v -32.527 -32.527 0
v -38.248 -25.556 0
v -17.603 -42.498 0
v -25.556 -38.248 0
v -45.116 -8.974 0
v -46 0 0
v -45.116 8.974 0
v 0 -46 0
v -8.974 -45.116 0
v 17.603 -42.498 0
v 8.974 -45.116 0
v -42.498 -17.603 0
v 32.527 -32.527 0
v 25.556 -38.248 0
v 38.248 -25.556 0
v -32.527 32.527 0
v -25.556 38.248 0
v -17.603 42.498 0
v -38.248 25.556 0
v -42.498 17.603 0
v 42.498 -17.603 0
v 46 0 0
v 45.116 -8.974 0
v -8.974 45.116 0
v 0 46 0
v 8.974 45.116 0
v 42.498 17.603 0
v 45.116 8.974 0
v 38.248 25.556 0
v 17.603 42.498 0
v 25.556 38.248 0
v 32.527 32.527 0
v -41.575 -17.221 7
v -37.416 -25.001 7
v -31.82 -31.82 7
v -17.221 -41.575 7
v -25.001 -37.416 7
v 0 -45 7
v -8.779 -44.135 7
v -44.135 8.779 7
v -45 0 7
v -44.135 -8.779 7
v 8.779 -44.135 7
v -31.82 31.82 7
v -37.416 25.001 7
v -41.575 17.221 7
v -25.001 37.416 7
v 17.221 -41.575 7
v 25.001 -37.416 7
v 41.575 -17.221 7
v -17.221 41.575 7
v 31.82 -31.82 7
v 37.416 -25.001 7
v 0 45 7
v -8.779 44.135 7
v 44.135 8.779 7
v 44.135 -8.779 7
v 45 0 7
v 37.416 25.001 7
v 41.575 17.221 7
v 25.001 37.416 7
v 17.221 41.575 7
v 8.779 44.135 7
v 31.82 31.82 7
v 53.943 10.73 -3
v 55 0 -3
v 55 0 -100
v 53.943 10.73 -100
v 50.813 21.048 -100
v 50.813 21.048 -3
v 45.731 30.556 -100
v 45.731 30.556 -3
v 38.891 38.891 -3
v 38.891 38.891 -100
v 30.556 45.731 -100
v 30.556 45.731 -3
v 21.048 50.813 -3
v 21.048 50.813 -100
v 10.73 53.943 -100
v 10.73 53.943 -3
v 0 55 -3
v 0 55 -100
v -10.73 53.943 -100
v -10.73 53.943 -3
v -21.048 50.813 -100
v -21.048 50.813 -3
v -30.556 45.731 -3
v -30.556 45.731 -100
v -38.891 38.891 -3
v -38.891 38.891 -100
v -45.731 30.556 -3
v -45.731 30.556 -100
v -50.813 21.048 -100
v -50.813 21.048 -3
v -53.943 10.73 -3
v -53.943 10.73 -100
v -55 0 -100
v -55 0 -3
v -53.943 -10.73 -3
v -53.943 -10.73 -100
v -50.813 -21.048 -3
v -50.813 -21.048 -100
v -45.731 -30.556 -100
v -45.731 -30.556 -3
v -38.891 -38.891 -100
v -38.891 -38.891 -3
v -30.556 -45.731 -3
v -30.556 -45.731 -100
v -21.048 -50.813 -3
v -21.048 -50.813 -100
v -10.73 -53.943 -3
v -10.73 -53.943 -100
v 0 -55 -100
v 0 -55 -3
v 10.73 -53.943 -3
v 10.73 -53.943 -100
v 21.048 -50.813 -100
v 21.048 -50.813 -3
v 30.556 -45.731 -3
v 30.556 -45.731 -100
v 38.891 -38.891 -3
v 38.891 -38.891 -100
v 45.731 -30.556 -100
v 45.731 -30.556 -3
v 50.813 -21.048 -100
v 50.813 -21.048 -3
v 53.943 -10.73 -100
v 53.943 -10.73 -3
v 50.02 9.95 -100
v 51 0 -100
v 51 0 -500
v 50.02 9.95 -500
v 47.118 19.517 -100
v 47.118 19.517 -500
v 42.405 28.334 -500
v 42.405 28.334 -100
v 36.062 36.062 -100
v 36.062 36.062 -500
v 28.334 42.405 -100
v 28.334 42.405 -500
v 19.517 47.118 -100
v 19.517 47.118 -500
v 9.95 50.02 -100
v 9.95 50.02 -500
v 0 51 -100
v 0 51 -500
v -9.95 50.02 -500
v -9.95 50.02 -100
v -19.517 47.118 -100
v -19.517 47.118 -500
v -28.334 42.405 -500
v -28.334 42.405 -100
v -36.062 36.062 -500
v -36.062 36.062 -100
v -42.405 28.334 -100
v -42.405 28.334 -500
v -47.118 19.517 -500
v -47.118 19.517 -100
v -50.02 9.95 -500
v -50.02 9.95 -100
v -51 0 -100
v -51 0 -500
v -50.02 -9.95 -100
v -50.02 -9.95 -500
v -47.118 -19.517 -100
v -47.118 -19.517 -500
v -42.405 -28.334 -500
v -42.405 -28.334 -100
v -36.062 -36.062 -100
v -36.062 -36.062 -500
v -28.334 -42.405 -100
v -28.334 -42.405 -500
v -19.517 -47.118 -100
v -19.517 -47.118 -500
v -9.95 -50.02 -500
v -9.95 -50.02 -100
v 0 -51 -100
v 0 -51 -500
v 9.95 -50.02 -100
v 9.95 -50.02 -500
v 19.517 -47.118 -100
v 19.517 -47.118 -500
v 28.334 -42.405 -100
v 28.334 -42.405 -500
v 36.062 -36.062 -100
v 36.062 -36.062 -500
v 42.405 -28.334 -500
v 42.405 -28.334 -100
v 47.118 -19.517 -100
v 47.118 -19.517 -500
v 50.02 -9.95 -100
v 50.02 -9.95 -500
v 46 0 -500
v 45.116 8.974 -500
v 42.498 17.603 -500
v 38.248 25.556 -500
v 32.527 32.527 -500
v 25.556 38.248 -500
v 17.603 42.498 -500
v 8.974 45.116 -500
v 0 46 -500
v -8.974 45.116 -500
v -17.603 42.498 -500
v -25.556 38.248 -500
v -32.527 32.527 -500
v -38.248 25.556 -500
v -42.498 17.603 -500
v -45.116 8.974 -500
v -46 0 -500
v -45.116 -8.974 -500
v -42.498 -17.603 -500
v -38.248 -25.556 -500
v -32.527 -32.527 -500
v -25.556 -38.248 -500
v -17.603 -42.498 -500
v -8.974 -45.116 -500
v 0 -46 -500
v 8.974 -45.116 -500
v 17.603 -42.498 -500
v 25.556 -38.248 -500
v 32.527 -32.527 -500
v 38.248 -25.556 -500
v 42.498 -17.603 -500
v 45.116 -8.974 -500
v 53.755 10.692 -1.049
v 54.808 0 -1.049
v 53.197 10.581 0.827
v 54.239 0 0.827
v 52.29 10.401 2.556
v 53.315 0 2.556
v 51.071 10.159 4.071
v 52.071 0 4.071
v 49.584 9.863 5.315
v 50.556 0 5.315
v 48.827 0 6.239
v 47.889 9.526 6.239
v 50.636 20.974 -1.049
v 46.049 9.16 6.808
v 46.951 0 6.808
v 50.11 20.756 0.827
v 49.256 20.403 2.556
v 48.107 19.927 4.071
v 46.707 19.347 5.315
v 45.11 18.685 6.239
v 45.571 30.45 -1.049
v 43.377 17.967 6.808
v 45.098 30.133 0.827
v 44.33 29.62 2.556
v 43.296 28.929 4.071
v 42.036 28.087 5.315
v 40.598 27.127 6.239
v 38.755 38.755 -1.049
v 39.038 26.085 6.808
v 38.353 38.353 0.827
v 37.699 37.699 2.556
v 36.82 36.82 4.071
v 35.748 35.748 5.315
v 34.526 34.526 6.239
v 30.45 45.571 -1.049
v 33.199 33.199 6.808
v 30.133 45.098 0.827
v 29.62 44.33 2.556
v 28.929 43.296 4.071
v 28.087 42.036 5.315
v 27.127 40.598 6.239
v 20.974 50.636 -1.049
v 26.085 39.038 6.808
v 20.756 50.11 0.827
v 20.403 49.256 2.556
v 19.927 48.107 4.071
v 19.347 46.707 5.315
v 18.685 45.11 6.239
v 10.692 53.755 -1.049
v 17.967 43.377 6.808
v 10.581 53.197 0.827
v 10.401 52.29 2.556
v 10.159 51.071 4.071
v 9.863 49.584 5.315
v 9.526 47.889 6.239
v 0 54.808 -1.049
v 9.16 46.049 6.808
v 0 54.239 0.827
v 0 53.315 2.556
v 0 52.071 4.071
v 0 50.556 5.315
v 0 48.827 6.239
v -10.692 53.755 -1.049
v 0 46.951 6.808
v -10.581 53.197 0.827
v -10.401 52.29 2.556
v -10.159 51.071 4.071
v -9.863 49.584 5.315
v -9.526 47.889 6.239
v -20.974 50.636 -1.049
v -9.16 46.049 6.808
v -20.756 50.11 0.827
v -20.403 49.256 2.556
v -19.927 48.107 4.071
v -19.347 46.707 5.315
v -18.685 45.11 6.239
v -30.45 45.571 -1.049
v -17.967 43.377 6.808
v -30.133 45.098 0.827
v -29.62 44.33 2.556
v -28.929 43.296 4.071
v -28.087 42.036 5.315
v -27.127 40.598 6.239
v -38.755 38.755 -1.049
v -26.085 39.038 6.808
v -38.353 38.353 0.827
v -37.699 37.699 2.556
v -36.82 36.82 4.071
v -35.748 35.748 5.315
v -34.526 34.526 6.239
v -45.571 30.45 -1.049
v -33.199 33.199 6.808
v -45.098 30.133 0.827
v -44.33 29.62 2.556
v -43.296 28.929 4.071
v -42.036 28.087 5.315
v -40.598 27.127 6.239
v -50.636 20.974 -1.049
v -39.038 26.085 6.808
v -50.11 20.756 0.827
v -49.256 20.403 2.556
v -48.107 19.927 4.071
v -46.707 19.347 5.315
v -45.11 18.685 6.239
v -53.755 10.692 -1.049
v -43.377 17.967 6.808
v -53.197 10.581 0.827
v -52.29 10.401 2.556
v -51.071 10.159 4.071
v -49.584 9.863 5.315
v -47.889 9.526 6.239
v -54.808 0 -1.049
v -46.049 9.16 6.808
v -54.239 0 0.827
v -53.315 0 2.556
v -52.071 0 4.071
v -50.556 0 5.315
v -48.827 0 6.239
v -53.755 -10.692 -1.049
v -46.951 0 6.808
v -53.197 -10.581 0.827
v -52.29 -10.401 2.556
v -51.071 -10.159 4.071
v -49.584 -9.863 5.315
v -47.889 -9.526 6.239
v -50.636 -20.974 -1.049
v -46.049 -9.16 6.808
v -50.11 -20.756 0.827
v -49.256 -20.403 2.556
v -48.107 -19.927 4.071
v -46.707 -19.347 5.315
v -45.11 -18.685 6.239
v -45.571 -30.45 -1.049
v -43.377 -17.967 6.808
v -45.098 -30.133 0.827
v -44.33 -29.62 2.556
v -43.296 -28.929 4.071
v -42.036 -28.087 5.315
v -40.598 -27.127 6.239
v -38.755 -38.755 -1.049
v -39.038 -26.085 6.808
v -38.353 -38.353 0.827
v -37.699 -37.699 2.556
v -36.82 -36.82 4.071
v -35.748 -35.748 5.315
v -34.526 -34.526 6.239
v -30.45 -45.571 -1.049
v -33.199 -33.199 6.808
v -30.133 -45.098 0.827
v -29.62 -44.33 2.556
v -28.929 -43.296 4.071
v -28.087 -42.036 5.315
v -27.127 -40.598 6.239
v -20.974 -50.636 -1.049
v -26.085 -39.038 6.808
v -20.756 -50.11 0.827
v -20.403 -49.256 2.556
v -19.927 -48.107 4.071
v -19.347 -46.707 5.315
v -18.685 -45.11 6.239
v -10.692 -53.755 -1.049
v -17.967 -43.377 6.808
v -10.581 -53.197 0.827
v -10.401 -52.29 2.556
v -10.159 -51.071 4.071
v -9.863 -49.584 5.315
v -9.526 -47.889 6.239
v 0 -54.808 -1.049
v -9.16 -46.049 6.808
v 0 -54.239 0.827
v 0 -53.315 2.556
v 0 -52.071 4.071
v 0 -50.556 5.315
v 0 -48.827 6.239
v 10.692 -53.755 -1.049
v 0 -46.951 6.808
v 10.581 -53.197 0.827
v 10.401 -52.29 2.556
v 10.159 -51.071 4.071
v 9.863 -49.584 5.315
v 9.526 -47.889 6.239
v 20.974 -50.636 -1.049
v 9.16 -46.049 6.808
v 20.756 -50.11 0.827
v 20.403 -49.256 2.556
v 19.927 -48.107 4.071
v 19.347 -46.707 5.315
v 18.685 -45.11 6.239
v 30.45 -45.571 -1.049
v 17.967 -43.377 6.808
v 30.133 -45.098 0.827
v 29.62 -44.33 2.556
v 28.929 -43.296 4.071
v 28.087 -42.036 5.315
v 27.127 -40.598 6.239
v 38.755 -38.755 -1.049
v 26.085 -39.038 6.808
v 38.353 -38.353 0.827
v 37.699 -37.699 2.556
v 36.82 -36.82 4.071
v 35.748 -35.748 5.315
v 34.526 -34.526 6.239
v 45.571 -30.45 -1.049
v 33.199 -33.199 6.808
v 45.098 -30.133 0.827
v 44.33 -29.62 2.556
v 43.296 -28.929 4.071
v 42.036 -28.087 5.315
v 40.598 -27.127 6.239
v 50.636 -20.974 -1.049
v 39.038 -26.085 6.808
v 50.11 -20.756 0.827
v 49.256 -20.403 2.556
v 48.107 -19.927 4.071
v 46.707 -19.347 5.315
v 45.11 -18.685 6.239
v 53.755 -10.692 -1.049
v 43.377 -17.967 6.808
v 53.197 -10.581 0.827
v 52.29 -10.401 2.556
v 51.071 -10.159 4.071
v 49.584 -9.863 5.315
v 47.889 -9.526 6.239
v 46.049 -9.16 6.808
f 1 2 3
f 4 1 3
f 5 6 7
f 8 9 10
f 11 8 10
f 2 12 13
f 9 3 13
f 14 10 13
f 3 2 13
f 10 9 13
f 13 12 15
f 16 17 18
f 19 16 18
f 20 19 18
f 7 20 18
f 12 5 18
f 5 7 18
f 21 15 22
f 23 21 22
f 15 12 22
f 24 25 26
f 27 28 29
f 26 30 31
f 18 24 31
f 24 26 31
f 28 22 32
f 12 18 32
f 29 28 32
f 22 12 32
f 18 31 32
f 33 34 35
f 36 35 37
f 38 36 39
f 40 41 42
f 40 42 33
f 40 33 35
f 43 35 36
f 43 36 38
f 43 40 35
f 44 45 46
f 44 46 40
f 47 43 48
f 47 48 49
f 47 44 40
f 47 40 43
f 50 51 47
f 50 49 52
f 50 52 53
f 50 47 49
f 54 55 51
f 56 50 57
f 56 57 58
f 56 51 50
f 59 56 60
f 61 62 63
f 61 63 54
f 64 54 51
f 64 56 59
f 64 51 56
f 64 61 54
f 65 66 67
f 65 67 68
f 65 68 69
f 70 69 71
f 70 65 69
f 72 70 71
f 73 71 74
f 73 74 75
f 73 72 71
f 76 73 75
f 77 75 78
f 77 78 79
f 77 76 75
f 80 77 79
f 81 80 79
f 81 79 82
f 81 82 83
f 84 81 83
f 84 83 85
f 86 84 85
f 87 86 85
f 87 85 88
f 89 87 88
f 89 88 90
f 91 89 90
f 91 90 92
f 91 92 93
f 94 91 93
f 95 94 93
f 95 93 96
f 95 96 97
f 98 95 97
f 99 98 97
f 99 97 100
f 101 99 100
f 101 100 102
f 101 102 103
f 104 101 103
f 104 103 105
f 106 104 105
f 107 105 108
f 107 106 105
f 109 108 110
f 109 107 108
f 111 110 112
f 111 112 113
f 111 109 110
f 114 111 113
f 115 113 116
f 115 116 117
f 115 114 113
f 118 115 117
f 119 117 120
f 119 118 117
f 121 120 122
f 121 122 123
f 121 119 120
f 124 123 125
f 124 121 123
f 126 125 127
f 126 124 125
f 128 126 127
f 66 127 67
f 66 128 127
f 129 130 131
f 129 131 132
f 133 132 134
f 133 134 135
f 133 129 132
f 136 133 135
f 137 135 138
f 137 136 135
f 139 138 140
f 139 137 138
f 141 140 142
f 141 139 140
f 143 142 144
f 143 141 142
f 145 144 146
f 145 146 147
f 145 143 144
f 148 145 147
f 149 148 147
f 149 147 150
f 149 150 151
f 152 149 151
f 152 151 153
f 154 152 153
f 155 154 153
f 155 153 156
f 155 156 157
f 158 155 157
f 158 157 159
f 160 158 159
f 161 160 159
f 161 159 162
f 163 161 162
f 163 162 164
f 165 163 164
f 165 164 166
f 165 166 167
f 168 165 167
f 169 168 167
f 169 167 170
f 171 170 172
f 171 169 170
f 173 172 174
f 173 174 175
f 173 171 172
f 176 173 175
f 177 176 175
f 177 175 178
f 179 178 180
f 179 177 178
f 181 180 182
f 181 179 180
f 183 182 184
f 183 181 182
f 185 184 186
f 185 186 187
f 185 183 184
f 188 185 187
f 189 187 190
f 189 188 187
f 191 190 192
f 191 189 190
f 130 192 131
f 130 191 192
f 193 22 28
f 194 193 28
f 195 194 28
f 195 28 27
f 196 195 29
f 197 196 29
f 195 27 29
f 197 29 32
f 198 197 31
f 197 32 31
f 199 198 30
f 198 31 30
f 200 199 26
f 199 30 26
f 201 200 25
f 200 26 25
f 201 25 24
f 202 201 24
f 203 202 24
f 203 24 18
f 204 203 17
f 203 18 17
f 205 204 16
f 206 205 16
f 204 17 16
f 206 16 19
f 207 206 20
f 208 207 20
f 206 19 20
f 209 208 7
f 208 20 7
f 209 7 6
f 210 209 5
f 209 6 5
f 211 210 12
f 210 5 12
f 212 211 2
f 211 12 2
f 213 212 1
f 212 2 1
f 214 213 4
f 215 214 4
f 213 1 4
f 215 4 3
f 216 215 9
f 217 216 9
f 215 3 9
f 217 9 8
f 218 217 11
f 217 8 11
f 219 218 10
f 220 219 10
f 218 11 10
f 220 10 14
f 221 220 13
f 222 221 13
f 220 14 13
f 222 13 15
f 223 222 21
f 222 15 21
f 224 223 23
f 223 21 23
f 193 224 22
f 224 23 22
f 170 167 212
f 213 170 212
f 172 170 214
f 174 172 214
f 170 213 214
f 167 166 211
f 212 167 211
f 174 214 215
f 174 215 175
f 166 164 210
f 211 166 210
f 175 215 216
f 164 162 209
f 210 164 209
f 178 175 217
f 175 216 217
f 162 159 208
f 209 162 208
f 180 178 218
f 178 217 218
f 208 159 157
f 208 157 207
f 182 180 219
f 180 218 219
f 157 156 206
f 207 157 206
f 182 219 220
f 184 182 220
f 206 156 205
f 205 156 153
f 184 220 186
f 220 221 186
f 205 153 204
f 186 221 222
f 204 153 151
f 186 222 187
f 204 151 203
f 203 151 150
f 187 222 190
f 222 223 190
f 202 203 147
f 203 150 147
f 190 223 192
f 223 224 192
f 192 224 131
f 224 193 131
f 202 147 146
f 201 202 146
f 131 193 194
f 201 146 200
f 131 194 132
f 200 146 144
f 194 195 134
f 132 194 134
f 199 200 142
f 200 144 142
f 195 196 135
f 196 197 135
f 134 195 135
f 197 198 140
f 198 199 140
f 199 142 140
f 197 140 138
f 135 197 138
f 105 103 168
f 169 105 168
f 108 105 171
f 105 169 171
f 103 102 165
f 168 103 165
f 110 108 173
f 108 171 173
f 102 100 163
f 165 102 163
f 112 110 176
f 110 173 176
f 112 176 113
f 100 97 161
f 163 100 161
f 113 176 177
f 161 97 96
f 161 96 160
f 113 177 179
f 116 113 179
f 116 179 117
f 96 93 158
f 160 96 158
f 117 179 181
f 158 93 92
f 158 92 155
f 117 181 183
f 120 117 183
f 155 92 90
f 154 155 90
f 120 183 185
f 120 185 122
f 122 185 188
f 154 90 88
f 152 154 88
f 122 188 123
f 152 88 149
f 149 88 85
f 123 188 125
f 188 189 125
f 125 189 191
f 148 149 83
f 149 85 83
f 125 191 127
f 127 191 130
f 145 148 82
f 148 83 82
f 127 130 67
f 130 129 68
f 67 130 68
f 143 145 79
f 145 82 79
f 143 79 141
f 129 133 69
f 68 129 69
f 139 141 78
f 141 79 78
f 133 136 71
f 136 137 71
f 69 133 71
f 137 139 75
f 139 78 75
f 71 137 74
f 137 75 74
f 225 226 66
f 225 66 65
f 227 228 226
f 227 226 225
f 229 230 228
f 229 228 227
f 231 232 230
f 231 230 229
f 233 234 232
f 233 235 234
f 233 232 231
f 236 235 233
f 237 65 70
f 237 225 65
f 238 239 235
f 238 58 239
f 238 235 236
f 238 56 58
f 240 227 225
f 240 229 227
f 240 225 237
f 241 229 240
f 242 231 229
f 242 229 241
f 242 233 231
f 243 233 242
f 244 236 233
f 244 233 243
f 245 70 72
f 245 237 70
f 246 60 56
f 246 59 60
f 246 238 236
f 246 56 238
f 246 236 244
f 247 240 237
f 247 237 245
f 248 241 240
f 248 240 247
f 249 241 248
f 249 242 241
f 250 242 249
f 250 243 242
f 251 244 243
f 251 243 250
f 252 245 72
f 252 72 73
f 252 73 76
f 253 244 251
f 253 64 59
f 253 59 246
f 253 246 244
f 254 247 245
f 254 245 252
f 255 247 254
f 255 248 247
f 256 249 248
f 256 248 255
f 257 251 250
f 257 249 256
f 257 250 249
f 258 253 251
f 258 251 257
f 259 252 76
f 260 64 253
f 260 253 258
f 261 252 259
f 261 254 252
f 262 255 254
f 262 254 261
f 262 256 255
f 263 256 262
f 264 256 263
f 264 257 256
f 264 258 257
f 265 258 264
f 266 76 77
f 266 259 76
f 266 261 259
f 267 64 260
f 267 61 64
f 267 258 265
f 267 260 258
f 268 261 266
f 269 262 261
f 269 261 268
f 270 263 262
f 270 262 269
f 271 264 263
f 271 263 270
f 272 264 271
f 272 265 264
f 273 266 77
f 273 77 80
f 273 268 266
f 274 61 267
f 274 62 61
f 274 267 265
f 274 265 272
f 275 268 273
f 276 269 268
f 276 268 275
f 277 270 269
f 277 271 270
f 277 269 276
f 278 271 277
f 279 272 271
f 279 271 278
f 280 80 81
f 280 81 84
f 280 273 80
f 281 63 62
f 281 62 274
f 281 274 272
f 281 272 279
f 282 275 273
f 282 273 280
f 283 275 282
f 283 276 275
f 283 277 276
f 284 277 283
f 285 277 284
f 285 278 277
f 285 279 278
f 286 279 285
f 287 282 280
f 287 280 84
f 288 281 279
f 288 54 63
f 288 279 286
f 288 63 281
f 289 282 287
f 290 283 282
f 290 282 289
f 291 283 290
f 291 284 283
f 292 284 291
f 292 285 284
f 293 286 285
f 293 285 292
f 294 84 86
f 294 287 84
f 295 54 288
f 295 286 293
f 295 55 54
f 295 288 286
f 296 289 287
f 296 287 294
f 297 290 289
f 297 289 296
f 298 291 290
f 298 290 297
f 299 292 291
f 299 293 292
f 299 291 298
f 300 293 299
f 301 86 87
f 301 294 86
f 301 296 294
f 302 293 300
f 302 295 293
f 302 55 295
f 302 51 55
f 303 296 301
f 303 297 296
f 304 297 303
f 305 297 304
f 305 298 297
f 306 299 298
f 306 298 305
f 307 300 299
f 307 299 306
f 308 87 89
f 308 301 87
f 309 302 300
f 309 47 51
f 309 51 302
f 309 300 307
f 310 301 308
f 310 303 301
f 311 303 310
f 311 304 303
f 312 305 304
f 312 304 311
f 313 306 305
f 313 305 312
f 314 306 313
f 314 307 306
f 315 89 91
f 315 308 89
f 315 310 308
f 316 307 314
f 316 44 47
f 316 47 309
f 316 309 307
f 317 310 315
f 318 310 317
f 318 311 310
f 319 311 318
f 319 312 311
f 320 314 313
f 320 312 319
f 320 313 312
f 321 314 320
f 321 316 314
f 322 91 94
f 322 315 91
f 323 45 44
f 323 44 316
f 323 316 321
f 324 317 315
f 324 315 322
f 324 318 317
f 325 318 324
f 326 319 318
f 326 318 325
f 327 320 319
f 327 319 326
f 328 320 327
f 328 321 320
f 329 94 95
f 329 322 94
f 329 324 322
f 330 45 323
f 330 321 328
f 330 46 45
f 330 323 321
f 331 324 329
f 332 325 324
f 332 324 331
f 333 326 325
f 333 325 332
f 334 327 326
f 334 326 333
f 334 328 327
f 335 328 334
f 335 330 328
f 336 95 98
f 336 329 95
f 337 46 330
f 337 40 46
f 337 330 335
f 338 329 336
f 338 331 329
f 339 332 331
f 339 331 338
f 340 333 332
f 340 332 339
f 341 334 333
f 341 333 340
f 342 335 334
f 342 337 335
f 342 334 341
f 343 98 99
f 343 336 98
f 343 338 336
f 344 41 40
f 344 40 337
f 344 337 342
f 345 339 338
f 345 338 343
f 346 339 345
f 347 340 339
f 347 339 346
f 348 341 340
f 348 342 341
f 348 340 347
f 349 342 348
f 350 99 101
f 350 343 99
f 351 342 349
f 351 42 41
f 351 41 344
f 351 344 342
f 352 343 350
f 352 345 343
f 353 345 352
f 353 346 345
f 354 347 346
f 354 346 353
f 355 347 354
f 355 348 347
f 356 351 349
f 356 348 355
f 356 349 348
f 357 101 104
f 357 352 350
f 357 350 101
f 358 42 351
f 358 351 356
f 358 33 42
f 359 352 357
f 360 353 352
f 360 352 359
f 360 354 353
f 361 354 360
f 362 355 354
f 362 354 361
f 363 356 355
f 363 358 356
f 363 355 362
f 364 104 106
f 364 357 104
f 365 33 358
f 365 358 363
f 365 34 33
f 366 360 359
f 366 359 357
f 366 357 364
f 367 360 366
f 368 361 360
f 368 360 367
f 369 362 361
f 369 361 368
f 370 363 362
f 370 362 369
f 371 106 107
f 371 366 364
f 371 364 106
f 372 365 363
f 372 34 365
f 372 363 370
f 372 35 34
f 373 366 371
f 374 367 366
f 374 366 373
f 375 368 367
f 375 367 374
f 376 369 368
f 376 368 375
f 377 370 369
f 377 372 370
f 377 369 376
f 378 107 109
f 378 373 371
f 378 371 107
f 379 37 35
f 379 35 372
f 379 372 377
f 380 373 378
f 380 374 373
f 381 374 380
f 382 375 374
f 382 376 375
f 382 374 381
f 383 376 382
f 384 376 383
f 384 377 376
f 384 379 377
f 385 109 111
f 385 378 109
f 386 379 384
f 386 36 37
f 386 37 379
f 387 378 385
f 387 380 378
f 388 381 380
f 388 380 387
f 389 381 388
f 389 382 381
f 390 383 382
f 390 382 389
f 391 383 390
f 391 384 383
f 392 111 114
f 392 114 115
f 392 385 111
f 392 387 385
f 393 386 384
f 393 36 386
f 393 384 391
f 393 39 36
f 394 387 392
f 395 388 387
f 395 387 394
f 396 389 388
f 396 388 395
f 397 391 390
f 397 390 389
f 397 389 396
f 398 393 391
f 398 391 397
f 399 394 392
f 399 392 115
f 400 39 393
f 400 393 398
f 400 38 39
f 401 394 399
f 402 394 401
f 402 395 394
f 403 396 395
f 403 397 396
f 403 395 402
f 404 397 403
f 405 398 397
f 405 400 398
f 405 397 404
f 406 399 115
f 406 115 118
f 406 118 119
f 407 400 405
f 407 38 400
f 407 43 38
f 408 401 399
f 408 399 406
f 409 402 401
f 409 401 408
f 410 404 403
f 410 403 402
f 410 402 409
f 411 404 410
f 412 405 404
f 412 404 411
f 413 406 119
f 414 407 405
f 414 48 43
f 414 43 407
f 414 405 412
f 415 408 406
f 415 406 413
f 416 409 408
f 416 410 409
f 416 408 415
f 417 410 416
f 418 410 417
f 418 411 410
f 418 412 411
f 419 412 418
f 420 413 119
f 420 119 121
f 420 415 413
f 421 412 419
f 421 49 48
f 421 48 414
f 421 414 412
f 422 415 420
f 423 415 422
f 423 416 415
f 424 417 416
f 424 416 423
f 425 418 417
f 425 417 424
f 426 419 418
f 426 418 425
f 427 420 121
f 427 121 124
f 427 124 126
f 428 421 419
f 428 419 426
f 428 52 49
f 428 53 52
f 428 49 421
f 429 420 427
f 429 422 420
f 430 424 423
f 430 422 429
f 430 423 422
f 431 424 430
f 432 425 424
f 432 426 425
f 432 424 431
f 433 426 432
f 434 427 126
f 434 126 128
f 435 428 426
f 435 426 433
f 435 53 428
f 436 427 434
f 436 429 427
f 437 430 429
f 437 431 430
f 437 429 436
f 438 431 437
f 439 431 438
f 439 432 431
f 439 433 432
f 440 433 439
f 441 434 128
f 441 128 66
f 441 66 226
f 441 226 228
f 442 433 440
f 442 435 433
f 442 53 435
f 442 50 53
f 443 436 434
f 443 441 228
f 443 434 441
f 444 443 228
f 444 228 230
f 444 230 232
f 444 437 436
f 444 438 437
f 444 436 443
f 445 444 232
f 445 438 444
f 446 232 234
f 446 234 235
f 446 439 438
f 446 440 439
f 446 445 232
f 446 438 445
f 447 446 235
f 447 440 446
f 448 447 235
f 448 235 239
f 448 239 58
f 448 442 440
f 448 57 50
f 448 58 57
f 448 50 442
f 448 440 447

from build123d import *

# Parameters (mm, degrees)
F0_R     = 55
F0_R_2   = 51
F0_R_3   = 46
F1_DEPTH = 7
F2_DEPTH = 500
F3_DEPTH = 100
F4_R     = 10


with BuildPart() as f1:
    # F0 (on Top) → F1 (new body)
    with BuildSketch(Plane.XY):
        Circle(F0_R)
        Circle(F0_R_2, mode=Mode.SUBTRACT)
        Circle(F0_R_2)
        Circle(F0_R_3, mode=Mode.SUBTRACT)
        Circle(F0_R_3)
    extrude(amount=F1_DEPTH)

    # F0 (on Top) → F2 (join)
    with BuildSketch(Plane.XY):
        Circle(F0_R_2)
        Circle(F0_R_3, mode=Mode.SUBTRACT)
    extrude(amount=-F2_DEPTH)

    # F0 (on Top) → F3 (join)
    with BuildSketch(Plane.XY):
        Circle(F0_R)
        Circle(F0_R_2, mode=Mode.SUBTRACT)
    extrude(amount=-F3_DEPTH)

    # F4
    f4_edges = [f1.edges().sort_by_distance(p)[0] for p in [
        (-55, 0, 7),
    ]]
    fillet(f4_edges, radius=F4_R)


solid = f1.part
